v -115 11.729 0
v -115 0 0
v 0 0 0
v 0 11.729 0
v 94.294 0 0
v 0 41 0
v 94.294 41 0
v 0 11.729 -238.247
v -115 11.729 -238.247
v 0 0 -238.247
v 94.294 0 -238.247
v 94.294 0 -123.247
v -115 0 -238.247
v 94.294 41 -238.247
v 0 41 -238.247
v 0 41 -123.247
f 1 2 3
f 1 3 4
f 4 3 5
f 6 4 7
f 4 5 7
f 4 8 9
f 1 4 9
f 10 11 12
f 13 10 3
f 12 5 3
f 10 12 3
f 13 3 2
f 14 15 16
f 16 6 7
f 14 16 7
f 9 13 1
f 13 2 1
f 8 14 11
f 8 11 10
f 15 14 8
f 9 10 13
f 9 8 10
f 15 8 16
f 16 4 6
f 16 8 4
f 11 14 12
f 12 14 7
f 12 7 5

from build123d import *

# Parameters (mm, degrees)
SKETCH1_W           = 94.294111711
SKETCH1_H           = 123.247490411
BOSS_EXTRUDE1_DEPTH = 41
SKETCH2_W           = 123.247490411
SKETCH2_H           = 11.729493647
BOSS_EXTRUDE2_DEPTH = 115
SKETCH3_W           = 115
SKETCH3_H           = 11.729493647
BOSS_EXTRUDE3_DEPTH = 115


with BuildPart() as part:
    # Sketch1 → Boss-Extrude1 (new body)
    with BuildSketch(Plane(origin=(0, 0, 0), x_dir=(1, 0, 0), z_dir=(0, 1, 0))):
        with Locations((47.147055855, 61.623745206)):
            Rectangle(SKETCH1_W, SKETCH1_H)
    extrude(amount=BOSS_EXTRUDE1_DEPTH)

    # Sketch2 → Boss-Extrude2 (add)
    with BuildSketch(Plane.ZY):
        with Locations((-61.623745206, 5.864746823)):
            Rectangle(SKETCH2_W, SKETCH2_H)
    extrude(amount=BOSS_EXTRUDE2_DEPTH)

    # Sketch3 → Boss-Extrude3 (add)
    with BuildSketch(Plane(origin=(0, 0, -123.247490411), x_dir=(-1, 0, 0), z_dir=(0, 0, -1))):
        Polygon((-94.294111711, 41), (-94.294111711, 0), (0, 0), (0, 11.729493647), (0, 41), align=None)
        with Locations((57.5, 5.864746823)):
            Rectangle(SKETCH3_W, SKETCH3_H)
    extrude(amount=BOSS_EXTRUDE3_DEPTH)


solid = part.part
